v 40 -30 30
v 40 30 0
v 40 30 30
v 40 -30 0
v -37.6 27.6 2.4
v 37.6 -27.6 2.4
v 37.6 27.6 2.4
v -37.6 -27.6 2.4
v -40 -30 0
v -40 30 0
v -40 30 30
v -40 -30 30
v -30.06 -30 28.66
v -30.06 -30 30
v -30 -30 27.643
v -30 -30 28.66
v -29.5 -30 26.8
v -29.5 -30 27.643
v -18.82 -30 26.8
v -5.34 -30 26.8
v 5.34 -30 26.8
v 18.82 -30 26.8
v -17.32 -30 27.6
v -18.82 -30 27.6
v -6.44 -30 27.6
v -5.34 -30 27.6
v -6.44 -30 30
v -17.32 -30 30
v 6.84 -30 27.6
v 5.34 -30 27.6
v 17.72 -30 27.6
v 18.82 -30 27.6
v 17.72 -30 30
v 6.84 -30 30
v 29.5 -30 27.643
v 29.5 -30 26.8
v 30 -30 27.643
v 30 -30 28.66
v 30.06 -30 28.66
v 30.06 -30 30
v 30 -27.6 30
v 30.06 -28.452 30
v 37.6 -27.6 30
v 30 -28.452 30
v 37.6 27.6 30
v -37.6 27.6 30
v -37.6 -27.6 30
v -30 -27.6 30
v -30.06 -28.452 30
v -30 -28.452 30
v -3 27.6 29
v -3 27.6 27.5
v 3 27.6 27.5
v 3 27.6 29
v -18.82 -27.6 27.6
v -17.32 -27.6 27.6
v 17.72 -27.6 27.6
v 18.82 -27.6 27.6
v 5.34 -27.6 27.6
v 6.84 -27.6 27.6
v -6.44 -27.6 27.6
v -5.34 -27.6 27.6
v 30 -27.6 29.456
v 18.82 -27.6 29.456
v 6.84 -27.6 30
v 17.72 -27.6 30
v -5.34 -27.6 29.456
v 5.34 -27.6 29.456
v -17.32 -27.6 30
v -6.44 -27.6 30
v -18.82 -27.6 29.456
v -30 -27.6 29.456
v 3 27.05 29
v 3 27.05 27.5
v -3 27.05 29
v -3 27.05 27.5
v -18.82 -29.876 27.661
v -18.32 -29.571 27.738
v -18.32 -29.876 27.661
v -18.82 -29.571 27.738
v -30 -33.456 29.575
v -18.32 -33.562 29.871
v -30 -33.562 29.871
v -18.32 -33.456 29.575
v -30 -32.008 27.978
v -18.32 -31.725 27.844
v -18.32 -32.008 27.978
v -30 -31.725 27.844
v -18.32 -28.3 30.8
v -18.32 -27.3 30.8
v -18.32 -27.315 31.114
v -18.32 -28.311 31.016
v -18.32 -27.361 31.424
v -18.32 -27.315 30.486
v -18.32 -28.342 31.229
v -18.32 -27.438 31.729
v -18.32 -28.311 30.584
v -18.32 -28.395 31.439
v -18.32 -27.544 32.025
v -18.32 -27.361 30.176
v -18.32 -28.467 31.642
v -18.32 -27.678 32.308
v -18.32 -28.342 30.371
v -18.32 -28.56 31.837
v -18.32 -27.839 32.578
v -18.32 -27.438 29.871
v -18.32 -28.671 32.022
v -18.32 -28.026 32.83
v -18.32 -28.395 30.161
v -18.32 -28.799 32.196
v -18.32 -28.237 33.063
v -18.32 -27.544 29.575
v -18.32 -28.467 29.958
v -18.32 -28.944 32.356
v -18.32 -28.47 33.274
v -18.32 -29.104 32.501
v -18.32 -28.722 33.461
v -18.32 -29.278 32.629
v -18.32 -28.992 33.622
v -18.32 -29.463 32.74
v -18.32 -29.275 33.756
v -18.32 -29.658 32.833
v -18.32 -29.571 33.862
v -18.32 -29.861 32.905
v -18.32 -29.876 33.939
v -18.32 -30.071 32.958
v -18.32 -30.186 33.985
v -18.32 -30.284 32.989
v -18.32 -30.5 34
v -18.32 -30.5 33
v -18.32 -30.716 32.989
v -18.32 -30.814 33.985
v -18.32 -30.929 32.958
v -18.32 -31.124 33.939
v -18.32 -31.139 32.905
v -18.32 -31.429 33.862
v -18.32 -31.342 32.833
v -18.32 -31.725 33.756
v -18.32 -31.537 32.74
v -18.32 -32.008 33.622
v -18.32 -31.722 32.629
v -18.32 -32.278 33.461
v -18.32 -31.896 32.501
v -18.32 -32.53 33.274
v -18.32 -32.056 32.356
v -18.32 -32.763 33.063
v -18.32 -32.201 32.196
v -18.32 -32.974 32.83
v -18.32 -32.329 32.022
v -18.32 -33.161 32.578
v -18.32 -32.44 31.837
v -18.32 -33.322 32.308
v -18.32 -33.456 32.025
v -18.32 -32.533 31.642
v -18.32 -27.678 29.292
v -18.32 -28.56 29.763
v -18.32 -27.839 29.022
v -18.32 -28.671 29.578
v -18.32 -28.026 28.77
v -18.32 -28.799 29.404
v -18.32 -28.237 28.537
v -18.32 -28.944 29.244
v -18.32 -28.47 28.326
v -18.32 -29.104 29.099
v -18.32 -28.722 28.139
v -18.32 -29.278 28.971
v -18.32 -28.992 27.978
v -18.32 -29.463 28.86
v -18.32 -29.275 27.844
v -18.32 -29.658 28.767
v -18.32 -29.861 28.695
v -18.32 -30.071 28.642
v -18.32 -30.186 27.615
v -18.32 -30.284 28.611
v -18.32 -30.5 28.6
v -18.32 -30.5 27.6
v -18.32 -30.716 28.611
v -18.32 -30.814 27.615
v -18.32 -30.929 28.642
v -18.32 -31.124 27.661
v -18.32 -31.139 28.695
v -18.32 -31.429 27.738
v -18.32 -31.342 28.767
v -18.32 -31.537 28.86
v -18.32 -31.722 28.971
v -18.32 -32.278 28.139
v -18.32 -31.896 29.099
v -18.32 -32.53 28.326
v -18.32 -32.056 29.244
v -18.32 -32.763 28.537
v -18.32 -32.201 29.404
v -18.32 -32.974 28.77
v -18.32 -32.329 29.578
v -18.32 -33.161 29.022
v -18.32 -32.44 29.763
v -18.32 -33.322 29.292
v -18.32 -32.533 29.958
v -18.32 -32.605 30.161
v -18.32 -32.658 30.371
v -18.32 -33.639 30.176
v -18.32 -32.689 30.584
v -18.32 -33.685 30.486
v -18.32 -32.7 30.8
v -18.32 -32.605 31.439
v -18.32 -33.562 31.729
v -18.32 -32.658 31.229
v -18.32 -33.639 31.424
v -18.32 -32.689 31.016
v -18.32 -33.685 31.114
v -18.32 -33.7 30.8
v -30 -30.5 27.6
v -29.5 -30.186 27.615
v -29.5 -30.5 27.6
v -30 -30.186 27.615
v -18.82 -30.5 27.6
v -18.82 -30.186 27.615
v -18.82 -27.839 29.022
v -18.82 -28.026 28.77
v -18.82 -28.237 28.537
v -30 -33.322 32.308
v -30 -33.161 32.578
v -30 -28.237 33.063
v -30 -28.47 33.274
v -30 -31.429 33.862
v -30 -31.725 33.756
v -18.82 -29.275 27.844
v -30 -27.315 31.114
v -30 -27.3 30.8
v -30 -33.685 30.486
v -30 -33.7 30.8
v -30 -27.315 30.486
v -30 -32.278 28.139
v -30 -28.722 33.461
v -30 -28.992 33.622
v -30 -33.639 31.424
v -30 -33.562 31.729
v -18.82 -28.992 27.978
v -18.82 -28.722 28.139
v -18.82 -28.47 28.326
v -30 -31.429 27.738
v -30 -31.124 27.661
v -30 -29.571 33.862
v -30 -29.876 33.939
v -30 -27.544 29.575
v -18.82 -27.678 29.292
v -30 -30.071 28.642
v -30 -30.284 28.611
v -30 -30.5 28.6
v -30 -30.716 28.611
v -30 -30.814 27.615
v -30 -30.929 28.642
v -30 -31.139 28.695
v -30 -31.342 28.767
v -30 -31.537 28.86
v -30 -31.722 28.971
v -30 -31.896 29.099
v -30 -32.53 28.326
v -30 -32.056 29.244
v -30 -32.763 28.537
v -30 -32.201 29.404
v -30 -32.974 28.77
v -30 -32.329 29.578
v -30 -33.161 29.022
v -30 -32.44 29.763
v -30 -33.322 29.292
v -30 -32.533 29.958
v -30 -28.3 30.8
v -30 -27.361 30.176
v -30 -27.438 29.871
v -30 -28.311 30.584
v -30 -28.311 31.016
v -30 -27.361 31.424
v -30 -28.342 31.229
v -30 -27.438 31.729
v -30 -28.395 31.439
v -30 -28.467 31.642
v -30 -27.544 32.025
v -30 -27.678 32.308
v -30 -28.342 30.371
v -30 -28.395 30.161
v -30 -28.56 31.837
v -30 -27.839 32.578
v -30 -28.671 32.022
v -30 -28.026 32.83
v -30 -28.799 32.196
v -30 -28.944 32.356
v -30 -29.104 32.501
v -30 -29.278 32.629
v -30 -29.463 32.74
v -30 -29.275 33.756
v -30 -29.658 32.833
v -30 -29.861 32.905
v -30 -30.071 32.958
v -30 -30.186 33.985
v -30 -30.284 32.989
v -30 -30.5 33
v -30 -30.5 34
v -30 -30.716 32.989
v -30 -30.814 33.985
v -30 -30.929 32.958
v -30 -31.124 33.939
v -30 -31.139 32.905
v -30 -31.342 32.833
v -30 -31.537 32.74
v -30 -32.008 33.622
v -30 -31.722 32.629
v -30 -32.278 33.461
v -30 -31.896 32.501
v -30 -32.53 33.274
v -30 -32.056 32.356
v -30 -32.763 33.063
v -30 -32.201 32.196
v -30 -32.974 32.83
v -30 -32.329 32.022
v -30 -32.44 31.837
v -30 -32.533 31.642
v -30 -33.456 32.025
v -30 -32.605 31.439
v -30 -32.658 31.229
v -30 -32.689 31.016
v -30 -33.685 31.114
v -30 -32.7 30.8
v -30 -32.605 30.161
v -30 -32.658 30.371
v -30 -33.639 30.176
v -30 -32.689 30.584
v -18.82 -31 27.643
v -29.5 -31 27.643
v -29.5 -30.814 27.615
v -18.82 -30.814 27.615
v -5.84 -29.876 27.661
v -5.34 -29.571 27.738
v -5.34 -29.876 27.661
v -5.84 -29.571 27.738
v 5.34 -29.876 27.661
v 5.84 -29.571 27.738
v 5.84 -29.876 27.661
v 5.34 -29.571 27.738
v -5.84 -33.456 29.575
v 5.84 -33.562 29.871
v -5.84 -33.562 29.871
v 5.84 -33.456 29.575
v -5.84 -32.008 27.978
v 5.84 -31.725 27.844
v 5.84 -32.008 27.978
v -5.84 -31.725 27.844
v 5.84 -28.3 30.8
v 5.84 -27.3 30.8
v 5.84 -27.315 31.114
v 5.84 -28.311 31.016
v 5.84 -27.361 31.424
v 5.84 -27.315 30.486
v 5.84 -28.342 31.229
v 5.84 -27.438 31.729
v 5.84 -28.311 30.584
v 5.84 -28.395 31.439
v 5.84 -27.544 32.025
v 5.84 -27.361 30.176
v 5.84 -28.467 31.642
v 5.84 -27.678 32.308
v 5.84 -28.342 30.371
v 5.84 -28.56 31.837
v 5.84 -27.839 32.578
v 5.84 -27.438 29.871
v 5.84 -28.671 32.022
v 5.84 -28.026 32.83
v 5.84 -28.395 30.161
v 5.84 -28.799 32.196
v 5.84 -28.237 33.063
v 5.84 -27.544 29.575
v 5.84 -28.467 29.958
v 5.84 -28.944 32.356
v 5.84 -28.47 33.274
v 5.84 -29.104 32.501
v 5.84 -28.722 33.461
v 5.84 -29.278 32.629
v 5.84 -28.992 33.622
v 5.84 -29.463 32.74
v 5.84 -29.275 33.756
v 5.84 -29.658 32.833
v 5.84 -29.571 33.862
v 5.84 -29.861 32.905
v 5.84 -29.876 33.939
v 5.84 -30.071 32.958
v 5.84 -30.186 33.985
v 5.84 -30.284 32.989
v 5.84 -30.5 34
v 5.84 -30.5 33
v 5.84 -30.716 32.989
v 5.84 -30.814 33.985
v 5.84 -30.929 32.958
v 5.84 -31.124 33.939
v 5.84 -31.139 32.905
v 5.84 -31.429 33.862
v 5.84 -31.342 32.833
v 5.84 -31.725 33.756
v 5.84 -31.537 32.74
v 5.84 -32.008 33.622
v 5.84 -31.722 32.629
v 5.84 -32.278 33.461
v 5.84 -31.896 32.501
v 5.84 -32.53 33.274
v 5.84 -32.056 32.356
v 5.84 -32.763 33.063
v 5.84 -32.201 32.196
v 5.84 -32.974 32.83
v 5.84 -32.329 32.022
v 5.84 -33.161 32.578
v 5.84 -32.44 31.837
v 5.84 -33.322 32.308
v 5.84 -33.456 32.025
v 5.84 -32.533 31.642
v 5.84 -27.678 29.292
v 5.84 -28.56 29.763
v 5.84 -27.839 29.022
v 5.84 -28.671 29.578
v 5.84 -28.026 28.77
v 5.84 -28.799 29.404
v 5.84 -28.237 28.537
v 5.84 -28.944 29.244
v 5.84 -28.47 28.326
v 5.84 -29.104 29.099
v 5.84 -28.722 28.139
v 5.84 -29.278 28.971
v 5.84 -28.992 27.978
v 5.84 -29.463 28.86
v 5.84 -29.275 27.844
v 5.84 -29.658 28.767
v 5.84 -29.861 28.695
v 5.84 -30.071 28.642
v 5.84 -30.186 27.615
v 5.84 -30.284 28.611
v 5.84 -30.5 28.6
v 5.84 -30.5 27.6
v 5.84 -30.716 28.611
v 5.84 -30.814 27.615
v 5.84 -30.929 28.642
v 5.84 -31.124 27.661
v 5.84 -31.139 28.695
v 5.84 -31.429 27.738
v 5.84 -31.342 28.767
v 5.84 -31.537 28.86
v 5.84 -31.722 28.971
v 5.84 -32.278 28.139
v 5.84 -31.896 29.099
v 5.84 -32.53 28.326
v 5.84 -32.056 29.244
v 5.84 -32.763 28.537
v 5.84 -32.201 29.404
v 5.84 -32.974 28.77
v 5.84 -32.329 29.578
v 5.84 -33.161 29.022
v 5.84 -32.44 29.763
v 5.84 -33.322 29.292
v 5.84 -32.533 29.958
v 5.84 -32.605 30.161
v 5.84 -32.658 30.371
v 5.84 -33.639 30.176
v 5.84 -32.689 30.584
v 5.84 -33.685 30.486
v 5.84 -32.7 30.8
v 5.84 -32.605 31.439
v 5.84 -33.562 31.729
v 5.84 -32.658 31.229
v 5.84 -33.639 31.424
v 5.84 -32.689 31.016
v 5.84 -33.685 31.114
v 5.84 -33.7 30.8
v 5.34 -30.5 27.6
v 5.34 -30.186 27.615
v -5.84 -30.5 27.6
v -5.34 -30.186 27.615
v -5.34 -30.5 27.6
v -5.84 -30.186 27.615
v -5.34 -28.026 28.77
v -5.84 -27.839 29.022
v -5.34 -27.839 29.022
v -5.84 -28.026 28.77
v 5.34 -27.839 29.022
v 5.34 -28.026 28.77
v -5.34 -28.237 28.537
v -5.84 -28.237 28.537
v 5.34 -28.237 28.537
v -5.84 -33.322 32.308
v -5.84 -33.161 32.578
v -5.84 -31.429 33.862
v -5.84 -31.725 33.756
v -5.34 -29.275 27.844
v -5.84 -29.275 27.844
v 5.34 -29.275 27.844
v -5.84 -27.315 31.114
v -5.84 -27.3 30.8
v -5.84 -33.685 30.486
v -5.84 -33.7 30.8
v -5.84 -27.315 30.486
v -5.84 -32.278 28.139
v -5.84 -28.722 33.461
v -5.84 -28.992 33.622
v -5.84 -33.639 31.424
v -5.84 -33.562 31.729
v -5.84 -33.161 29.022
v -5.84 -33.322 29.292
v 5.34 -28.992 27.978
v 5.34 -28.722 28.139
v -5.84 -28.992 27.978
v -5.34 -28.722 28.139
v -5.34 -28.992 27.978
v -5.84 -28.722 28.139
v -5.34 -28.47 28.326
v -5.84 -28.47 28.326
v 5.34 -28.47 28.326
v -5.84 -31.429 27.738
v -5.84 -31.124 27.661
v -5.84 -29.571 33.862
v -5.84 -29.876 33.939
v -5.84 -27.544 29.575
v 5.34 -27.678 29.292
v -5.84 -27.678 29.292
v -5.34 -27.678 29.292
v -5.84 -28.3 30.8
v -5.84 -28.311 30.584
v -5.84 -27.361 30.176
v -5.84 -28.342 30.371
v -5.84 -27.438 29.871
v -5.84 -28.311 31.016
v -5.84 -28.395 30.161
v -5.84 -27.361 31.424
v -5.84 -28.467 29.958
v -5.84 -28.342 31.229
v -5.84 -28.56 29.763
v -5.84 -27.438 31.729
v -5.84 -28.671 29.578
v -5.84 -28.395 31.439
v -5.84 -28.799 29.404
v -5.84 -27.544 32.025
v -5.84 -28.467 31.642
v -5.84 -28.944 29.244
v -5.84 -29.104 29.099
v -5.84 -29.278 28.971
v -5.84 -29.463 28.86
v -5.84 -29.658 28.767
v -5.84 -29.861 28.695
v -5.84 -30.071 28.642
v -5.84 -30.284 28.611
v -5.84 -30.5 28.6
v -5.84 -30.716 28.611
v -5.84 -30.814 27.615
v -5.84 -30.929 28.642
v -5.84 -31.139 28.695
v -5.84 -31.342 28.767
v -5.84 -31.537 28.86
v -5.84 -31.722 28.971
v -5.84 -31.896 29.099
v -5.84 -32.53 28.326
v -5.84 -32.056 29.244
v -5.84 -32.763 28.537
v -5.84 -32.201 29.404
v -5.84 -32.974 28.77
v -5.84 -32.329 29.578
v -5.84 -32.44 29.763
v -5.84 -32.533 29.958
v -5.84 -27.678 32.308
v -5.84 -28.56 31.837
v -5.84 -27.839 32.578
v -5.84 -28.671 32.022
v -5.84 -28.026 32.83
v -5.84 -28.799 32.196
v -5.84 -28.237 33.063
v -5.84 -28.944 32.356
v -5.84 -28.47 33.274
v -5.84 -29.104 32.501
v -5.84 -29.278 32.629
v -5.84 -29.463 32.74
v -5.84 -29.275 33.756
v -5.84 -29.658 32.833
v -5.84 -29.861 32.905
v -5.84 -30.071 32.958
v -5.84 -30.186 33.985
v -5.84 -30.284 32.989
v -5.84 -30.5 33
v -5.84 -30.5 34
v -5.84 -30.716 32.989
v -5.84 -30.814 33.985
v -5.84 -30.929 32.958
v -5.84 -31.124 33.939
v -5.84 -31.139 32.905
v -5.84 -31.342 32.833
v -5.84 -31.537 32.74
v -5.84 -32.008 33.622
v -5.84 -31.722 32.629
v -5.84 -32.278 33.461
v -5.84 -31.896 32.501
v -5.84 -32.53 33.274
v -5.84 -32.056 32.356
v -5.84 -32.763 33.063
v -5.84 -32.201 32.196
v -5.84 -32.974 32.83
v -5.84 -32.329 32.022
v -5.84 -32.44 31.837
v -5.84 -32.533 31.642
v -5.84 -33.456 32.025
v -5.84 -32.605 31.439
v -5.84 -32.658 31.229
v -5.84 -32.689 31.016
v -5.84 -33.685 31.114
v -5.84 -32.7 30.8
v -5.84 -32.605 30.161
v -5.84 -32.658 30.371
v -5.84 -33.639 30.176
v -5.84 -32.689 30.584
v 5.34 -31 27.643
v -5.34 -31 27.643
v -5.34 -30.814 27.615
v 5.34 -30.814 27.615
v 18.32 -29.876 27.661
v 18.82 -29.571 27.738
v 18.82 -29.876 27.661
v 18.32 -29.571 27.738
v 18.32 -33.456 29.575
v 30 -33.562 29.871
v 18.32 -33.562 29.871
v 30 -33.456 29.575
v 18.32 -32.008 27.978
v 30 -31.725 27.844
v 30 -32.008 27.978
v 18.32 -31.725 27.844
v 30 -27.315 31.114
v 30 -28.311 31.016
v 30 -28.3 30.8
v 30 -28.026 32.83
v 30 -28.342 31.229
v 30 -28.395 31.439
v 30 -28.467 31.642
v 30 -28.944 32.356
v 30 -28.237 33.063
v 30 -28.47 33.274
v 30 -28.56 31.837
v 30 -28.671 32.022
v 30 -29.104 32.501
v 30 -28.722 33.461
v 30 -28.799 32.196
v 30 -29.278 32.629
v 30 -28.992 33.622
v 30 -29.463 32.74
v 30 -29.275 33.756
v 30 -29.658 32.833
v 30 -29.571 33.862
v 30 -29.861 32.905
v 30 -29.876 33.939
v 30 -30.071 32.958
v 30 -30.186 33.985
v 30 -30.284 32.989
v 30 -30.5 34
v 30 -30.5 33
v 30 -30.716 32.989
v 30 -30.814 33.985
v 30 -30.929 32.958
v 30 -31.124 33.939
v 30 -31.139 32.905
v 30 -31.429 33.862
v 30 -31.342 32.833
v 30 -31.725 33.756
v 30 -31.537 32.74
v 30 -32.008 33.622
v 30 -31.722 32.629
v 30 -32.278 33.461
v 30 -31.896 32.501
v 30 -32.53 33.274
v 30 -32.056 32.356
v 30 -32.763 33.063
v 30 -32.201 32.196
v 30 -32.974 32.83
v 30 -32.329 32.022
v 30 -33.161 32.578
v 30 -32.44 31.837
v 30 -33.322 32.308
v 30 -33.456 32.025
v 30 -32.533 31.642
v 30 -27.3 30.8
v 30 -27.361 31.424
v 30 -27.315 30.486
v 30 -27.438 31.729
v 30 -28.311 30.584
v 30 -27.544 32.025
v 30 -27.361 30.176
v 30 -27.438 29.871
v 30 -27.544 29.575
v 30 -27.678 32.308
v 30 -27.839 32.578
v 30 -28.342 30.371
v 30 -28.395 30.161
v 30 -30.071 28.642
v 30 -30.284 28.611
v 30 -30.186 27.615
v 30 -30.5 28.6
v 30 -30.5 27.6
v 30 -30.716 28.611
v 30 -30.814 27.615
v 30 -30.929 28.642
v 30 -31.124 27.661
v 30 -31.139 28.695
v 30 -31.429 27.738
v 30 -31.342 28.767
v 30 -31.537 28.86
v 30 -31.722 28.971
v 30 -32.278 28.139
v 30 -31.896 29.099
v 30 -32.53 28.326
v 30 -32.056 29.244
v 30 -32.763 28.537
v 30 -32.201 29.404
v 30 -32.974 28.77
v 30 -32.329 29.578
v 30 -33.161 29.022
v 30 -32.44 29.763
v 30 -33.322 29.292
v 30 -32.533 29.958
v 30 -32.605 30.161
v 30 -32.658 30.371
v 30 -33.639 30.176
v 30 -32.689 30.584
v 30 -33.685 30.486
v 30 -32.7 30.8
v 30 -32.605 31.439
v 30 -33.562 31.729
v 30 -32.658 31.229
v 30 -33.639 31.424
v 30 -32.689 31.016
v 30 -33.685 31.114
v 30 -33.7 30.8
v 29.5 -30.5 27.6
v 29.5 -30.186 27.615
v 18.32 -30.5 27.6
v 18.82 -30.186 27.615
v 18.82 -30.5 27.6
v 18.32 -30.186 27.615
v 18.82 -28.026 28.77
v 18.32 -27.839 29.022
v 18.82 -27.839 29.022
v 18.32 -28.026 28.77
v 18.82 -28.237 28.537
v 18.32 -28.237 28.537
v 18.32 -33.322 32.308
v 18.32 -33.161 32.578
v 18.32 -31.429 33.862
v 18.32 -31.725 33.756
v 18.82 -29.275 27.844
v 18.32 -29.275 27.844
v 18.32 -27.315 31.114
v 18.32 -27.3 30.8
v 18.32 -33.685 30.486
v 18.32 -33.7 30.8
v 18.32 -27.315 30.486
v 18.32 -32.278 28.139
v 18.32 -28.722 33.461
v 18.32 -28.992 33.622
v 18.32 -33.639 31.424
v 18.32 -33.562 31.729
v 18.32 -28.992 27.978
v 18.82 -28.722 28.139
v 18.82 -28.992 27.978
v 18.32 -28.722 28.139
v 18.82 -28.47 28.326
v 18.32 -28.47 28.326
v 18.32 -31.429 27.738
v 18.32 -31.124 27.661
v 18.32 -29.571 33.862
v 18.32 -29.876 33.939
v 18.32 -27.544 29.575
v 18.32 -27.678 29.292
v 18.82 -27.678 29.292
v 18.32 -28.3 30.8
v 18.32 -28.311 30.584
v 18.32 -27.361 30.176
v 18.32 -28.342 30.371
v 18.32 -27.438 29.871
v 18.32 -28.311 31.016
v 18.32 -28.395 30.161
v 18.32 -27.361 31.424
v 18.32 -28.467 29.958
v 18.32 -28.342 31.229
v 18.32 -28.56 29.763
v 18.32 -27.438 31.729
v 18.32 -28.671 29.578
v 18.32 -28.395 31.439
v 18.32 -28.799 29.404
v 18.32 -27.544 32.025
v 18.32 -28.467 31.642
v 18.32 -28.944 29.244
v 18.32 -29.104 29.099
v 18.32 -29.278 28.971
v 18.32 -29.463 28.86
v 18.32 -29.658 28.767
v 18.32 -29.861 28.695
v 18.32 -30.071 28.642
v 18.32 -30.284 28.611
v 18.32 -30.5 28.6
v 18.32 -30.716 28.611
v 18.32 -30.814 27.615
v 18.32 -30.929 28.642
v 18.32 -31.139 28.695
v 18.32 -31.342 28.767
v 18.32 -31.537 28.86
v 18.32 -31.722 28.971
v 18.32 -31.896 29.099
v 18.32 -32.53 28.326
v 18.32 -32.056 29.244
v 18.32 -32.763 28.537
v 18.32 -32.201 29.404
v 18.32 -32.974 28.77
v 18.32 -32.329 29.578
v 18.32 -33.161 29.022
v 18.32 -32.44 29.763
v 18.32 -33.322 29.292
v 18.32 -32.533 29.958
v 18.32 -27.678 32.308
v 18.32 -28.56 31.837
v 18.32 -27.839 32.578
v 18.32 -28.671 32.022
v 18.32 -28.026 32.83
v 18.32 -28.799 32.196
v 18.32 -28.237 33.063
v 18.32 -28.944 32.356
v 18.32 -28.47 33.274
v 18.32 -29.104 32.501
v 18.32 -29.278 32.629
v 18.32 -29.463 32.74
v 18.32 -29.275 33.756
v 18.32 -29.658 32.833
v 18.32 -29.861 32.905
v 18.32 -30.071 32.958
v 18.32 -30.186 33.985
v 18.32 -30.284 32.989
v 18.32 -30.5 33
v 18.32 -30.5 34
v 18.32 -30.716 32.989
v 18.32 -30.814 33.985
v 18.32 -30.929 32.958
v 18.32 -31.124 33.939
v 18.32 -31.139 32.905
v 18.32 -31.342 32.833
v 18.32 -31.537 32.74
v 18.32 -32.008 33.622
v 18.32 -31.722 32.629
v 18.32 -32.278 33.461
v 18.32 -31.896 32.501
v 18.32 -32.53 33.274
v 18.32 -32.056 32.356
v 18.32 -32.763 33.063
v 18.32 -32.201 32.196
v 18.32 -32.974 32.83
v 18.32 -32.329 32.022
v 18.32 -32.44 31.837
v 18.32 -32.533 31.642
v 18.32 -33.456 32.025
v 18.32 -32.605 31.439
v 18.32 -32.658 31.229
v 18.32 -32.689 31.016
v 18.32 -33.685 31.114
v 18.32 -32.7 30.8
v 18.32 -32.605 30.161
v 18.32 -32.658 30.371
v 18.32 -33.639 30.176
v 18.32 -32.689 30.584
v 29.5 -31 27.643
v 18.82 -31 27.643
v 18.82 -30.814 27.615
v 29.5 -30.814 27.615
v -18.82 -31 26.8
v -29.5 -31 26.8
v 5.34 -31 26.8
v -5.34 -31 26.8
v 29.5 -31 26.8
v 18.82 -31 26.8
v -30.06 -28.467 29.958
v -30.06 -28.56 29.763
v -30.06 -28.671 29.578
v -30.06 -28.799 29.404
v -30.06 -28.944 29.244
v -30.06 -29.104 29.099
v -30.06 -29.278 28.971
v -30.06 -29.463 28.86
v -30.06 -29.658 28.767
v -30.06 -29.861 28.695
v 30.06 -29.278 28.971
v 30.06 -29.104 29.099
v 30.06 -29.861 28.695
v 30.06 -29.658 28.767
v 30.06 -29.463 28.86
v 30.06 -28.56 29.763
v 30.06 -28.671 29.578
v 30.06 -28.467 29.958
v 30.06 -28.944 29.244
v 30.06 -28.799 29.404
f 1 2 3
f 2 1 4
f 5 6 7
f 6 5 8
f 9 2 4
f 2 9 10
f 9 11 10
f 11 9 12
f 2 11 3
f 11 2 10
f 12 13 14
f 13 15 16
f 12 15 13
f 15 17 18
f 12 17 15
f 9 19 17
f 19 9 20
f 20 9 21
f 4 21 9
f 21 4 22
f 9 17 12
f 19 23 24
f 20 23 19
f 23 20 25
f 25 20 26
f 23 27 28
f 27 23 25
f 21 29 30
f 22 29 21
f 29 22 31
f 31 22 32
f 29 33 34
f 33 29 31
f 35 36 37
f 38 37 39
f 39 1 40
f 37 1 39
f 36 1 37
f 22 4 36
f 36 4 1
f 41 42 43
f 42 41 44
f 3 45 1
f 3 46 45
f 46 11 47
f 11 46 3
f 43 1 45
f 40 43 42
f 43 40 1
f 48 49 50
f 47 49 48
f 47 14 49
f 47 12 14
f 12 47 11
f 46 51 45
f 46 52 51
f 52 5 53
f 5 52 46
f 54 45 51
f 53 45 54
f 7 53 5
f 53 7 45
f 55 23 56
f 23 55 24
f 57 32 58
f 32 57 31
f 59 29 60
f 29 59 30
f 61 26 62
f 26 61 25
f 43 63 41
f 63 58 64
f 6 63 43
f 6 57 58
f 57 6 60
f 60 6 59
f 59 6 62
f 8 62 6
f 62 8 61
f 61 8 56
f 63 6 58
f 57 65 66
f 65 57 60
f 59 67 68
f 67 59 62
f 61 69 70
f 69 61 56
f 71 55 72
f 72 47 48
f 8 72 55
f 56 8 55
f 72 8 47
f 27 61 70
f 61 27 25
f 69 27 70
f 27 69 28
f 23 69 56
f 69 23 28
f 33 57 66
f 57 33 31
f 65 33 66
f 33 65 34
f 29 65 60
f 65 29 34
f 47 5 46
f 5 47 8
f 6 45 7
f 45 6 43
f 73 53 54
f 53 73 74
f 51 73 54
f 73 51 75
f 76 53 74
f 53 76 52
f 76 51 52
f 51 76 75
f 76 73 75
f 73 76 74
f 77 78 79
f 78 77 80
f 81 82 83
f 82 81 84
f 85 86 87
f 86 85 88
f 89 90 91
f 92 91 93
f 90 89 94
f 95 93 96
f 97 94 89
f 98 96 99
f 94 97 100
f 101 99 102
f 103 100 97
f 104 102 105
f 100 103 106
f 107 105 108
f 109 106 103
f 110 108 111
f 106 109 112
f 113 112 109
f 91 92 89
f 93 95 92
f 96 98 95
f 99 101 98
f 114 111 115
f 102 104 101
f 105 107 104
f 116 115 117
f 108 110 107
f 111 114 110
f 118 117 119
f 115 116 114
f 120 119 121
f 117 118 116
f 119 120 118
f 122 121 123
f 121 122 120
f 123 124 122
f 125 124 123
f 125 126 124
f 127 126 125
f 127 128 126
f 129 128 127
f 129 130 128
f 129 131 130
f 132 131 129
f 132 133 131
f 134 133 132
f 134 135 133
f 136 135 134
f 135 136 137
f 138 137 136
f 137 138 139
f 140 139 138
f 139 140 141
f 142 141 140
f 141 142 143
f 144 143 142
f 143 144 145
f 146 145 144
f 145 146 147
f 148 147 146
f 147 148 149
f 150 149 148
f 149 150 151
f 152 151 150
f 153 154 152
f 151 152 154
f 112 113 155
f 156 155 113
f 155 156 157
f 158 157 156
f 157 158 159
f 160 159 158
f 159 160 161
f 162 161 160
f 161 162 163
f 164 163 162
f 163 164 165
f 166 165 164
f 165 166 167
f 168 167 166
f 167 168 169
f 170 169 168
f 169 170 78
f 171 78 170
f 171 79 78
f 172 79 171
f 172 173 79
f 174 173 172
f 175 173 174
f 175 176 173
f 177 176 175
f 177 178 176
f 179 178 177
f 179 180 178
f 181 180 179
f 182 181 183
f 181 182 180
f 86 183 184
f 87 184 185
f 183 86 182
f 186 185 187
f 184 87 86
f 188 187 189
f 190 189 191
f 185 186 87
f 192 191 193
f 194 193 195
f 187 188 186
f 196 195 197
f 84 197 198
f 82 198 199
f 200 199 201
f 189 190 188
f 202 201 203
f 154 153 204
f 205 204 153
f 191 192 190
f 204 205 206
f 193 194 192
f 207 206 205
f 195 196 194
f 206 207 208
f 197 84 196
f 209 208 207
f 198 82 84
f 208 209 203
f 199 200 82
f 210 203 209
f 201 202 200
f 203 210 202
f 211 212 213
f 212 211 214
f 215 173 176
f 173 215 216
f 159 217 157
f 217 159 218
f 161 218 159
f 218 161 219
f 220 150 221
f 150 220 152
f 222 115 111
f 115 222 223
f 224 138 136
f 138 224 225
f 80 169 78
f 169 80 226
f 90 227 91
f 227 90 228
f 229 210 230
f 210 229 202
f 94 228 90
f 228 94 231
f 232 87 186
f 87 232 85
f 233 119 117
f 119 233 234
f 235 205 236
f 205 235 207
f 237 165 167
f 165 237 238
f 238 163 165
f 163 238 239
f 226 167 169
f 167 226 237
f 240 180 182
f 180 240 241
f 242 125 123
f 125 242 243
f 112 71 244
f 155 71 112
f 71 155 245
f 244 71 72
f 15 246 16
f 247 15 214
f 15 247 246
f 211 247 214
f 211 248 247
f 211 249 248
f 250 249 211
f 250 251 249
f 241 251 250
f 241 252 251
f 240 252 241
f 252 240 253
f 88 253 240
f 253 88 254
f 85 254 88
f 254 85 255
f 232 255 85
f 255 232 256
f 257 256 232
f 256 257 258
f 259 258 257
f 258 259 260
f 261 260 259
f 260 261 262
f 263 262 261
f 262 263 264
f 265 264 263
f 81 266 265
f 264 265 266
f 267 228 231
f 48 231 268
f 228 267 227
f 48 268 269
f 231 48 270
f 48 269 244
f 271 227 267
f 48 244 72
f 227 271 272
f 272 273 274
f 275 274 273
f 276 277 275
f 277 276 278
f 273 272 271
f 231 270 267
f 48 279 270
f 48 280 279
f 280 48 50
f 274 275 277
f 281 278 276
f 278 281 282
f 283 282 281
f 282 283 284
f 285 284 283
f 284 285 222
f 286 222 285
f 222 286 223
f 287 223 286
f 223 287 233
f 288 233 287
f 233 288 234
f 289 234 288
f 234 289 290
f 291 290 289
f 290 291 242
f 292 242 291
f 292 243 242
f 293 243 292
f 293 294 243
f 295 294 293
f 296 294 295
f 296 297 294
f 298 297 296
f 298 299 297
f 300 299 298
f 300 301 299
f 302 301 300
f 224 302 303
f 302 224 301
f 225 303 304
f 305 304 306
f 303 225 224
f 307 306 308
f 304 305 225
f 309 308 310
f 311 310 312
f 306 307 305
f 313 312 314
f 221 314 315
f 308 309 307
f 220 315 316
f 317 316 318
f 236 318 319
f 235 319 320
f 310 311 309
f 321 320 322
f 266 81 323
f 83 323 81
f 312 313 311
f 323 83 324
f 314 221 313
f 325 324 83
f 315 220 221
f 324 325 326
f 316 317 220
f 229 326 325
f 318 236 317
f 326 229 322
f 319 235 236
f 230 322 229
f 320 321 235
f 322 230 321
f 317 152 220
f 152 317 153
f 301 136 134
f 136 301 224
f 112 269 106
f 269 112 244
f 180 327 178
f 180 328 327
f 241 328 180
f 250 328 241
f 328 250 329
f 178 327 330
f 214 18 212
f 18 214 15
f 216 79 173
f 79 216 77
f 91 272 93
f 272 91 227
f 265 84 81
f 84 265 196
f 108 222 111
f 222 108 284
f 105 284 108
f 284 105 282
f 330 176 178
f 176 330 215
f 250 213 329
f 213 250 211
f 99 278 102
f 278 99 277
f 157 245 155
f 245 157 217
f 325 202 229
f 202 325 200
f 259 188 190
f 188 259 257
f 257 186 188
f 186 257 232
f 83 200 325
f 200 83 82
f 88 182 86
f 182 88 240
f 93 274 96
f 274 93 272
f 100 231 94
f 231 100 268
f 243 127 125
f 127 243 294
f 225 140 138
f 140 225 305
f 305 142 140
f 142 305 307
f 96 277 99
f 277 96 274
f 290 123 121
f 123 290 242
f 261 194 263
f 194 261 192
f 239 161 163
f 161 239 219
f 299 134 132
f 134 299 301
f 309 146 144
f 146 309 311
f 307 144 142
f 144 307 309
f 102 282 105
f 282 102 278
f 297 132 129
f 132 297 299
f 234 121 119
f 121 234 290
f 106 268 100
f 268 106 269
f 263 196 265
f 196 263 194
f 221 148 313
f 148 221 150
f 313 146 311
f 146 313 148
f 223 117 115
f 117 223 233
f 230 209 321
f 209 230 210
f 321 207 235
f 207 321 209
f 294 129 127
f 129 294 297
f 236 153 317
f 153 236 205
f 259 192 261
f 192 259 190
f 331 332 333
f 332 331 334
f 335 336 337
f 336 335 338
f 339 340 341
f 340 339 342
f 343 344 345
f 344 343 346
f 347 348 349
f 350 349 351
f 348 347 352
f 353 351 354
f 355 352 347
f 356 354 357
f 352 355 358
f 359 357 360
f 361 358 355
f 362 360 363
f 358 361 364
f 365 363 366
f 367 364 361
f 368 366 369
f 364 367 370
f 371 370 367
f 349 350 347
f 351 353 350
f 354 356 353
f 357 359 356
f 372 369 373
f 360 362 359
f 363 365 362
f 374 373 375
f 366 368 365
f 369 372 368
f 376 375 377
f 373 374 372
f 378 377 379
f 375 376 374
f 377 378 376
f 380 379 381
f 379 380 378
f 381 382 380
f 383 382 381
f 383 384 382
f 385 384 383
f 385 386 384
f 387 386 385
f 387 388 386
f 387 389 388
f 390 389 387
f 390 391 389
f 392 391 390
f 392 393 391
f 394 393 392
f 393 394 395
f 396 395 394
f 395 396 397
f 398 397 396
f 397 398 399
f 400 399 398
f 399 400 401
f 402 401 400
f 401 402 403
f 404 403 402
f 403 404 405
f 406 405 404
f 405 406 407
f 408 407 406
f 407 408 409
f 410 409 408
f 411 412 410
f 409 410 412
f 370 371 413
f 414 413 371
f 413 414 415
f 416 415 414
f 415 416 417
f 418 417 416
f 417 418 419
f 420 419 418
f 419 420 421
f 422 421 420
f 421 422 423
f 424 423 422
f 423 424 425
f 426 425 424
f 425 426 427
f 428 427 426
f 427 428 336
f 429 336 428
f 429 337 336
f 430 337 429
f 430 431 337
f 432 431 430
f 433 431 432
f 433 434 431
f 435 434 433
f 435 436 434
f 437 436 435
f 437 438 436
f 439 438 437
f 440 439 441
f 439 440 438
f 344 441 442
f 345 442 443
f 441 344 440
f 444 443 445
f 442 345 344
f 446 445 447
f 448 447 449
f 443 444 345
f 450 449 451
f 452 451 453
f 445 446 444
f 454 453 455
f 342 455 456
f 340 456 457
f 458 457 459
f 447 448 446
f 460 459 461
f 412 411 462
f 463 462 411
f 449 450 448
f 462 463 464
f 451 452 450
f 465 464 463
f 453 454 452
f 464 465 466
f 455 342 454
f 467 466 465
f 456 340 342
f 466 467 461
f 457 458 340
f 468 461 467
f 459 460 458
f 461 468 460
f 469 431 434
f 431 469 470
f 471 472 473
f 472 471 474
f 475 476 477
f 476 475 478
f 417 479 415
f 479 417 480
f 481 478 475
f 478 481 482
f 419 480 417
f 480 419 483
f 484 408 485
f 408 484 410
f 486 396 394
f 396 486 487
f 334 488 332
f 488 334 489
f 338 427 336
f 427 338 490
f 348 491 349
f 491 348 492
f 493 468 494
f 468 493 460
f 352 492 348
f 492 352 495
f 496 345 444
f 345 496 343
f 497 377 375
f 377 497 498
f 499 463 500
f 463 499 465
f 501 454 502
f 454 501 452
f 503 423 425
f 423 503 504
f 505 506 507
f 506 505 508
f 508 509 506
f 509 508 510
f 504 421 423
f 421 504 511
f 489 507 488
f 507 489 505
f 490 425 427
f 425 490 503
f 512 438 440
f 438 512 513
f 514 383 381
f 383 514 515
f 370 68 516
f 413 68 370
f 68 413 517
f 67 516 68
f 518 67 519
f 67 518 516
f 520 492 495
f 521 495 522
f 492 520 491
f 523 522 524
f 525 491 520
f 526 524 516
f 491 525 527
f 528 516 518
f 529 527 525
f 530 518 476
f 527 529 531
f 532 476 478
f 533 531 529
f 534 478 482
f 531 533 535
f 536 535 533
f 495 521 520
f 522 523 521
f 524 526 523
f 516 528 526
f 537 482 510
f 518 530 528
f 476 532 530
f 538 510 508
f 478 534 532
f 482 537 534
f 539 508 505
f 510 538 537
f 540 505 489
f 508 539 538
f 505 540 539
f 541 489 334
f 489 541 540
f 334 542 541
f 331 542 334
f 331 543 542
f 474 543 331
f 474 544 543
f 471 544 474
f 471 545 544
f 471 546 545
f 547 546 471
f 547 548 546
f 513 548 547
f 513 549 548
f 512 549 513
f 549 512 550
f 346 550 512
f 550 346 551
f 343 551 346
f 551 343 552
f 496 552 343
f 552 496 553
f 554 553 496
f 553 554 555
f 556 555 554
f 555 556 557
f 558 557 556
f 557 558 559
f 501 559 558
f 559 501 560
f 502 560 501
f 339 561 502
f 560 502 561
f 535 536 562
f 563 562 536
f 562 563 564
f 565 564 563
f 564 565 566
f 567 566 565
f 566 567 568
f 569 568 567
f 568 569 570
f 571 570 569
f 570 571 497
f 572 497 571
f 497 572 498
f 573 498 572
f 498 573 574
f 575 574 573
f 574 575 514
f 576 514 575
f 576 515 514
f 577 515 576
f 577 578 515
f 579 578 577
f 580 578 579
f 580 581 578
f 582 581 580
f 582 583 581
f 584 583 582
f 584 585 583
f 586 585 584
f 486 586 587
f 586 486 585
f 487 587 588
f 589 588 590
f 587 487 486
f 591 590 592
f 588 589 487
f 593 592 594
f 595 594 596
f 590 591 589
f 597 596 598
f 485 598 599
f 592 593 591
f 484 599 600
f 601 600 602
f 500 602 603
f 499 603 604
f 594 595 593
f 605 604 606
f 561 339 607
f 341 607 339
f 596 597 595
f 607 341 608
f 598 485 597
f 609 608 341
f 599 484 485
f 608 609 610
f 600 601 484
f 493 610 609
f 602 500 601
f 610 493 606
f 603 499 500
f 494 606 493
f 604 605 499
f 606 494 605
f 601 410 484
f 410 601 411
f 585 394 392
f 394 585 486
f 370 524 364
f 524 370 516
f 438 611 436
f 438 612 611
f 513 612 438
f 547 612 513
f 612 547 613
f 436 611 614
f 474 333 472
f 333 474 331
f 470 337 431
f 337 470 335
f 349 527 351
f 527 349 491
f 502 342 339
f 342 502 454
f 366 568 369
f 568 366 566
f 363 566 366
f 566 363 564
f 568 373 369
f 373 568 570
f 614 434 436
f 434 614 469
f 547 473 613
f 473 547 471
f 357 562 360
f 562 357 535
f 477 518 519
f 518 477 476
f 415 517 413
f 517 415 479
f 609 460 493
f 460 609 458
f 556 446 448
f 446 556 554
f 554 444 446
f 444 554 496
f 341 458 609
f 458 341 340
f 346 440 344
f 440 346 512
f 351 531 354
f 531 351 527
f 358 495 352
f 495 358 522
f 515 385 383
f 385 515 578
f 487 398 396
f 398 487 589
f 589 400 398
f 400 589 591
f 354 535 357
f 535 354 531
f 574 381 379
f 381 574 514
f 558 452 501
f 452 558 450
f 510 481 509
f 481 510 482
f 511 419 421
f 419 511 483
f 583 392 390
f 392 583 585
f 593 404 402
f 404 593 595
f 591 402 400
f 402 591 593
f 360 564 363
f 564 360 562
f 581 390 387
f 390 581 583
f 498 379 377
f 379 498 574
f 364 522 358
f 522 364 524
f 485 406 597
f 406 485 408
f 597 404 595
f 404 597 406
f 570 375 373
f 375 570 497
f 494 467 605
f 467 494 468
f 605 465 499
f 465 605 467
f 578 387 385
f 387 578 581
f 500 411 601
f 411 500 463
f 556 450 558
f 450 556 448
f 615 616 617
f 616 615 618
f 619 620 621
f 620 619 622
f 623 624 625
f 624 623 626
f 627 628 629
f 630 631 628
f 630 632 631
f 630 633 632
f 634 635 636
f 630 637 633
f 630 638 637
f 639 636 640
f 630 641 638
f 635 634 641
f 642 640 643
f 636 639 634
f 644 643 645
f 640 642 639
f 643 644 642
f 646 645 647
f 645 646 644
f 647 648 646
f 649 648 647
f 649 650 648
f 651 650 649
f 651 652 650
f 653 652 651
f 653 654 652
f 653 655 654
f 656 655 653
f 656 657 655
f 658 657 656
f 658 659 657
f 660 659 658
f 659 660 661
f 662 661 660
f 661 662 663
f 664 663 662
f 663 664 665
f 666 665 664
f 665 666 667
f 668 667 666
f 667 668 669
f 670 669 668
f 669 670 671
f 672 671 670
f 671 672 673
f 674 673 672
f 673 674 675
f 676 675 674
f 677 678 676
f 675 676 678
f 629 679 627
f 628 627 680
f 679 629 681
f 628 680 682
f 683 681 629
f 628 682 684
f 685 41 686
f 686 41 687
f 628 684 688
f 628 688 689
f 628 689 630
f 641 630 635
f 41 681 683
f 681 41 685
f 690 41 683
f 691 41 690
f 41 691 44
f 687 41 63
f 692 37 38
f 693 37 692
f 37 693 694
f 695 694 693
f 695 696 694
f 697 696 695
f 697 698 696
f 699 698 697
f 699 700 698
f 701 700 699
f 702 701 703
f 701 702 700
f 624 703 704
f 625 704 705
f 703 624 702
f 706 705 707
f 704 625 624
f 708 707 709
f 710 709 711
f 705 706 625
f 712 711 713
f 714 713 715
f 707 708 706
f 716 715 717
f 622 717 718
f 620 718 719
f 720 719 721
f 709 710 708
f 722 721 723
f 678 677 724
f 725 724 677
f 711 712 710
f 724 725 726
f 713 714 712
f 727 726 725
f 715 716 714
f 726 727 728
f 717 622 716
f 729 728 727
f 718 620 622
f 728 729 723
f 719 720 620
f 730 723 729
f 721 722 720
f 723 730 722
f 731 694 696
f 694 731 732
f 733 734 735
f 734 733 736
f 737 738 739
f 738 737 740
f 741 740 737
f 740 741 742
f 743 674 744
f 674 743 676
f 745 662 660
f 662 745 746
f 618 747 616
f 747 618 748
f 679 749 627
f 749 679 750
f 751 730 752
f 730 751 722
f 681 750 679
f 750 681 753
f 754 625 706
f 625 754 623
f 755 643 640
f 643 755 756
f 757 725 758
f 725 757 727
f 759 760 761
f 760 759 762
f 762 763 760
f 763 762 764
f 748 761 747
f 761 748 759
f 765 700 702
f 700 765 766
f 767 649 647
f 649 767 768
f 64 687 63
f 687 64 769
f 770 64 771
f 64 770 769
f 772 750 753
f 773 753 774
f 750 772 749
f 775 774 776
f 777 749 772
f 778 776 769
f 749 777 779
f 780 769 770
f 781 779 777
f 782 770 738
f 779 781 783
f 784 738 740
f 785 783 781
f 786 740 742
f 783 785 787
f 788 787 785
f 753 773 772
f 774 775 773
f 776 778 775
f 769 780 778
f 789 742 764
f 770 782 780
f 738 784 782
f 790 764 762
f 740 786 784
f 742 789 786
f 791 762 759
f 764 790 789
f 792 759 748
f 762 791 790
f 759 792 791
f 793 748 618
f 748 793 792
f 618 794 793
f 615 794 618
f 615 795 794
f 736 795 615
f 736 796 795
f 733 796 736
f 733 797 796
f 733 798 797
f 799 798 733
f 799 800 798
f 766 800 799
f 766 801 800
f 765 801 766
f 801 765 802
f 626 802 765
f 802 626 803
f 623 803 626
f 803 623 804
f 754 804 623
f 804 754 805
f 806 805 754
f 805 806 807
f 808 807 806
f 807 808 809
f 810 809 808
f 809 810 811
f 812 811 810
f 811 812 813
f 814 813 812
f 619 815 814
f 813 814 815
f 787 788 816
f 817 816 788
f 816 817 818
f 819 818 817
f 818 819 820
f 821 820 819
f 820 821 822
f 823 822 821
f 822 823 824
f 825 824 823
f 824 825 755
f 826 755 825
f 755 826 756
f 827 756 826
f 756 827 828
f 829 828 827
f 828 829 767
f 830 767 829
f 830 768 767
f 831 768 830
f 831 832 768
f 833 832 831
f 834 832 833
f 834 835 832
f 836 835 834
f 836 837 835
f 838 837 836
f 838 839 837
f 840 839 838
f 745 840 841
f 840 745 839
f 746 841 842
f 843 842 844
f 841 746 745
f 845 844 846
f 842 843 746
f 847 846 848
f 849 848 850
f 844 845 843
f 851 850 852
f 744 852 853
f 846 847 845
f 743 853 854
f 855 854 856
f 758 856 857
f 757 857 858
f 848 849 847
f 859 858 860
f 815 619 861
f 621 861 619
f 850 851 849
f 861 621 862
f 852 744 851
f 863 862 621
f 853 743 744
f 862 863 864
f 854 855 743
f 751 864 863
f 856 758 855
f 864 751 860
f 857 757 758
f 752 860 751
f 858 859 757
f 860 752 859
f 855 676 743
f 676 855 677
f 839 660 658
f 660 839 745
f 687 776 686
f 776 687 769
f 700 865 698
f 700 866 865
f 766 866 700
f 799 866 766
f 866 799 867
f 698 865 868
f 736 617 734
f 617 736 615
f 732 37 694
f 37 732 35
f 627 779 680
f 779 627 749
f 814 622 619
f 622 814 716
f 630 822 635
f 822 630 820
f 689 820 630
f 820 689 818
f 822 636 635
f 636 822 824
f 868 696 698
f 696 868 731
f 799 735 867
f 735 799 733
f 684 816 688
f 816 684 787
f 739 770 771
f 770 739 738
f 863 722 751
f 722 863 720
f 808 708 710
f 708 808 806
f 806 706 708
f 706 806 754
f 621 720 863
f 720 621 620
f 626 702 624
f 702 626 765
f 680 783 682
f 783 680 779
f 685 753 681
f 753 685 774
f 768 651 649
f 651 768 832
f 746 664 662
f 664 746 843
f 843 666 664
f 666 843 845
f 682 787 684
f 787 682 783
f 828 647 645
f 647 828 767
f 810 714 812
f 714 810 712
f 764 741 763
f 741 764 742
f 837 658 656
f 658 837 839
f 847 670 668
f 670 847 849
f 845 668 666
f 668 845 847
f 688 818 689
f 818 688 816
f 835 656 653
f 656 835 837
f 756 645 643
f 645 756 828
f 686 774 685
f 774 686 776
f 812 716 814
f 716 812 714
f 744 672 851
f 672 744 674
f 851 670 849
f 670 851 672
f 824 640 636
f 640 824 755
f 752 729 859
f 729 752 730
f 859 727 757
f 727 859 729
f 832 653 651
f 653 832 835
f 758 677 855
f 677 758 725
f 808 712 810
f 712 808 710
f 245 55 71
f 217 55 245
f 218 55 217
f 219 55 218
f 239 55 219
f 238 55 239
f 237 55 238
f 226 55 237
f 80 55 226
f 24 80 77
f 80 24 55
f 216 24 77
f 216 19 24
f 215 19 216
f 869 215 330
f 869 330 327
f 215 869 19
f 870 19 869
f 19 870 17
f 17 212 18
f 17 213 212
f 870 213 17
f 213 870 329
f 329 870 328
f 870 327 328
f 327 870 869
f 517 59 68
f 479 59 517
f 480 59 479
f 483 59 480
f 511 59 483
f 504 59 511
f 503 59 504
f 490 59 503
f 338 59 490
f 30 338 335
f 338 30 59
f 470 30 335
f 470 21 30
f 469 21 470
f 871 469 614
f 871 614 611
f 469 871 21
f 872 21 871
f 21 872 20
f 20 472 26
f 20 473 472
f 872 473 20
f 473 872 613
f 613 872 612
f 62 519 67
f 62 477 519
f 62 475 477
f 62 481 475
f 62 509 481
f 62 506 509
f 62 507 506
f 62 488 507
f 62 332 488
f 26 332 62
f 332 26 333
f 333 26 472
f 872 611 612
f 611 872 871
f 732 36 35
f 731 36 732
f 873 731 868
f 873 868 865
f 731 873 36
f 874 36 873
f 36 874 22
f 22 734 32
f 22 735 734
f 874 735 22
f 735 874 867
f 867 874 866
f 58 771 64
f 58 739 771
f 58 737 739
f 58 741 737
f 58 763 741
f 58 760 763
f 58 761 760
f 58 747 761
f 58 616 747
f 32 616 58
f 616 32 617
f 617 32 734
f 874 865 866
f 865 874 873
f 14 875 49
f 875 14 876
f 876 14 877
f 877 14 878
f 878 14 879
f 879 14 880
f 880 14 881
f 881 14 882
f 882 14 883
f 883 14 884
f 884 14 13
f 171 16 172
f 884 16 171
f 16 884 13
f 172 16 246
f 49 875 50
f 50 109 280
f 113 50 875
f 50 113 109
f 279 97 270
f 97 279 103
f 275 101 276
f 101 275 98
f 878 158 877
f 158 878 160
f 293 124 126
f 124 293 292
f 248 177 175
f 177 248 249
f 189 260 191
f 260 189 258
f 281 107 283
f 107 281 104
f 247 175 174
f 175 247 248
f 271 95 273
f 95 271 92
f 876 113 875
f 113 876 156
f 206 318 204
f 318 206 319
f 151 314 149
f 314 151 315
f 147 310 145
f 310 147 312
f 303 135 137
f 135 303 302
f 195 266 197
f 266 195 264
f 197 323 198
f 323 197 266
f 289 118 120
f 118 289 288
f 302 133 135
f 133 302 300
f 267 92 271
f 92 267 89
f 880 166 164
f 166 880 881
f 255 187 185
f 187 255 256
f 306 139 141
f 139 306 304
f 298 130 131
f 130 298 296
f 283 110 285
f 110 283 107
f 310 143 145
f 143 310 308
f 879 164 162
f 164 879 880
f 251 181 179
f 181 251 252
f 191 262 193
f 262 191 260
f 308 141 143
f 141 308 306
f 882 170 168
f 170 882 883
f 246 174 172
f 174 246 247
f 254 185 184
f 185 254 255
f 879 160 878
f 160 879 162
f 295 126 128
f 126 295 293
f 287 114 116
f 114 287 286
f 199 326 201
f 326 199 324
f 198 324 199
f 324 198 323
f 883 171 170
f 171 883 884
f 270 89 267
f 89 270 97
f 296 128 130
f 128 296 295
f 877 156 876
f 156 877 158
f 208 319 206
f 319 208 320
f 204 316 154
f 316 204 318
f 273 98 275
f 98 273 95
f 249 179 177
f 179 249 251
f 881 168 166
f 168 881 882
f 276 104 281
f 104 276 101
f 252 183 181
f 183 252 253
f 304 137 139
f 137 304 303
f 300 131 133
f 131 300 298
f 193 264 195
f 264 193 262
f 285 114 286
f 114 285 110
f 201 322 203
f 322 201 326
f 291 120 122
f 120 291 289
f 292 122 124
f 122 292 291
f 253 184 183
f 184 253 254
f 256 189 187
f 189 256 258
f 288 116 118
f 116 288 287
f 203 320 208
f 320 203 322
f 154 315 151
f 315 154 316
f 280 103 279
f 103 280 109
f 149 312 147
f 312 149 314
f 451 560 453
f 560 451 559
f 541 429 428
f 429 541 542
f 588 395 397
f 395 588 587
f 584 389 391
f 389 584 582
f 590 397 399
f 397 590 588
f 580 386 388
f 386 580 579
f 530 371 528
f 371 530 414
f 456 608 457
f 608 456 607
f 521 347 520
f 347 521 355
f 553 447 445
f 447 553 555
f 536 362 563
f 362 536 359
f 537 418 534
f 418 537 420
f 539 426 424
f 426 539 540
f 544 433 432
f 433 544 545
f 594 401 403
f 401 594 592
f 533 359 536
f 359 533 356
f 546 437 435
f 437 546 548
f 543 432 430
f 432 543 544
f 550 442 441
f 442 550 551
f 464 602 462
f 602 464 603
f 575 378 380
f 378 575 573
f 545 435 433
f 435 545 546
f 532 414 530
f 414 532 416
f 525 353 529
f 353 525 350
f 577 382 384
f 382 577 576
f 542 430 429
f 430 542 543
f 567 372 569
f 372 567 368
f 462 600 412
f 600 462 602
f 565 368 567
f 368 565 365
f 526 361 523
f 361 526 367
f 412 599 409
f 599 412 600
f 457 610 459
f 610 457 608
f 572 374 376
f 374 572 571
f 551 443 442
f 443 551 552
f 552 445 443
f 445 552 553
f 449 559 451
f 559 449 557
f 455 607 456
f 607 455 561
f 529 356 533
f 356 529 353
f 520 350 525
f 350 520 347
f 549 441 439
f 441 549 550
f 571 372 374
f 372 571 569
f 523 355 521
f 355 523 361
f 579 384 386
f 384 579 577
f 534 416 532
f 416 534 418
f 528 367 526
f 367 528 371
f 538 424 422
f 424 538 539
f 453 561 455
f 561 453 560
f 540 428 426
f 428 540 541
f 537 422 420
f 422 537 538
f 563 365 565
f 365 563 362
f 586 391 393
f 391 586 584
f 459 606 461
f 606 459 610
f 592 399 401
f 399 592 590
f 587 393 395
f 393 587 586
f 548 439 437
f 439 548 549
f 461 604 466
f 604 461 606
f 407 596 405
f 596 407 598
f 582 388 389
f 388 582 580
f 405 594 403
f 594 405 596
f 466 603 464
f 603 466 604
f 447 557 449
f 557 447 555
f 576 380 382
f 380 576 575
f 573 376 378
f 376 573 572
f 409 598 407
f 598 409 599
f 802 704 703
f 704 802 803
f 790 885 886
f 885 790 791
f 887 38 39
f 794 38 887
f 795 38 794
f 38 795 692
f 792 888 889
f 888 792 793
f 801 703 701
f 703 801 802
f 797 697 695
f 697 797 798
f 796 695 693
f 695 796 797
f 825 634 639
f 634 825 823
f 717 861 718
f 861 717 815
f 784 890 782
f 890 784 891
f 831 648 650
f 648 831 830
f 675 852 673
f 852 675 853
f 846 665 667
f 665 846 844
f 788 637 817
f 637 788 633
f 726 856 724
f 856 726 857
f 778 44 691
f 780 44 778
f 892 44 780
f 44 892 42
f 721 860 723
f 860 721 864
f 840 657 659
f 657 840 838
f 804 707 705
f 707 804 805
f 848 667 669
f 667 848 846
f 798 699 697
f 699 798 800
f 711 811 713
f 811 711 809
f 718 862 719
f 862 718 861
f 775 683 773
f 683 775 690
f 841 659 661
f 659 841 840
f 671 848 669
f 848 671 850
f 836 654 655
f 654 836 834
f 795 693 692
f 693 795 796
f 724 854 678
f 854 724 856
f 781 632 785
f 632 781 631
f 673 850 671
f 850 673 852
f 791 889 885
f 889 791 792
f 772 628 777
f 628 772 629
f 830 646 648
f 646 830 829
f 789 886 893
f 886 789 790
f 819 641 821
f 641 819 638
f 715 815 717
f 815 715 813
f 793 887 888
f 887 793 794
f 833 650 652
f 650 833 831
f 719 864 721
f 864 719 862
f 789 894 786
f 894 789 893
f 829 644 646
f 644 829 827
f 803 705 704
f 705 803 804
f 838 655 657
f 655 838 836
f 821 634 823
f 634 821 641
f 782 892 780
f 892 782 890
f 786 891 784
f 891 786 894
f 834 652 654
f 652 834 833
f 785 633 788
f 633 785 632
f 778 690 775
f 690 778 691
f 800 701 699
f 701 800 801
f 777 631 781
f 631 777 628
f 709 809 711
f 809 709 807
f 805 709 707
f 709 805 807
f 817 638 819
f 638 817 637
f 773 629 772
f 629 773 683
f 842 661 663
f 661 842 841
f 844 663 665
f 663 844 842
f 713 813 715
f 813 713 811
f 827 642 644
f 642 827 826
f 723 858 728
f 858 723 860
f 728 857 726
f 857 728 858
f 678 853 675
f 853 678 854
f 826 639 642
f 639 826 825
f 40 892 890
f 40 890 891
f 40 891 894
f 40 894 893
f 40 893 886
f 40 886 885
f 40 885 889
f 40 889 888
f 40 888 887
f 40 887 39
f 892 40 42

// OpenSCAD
// Box with print-in-place hinge (v4: bridge webs to kill band overhangs)
part = "box"; // [box, lid, pin, assembly]
cadverify_only = "";
module instance(name, part, unit = 1) {
    echo(cadverify_instance = [name, part, unit]);
    if (cadverify_only == "" || cadverify_only == name) children();
}

Rkn = 3.2; rbore = 2.2; rpin = 1.9;
yh = -30.5; zh = 30.8;
lid_zh = 3.4;
lid_lift = 27.4;
pin_lift_z = 27.8; pin_shift_y = -30.5;
k0x0=-30; k0x1=-18.32;
k1x0=-17.92; k1x1=-6.24;
k2x0=-5.84; k2x1=5.84;
k3x0=6.24; k3x1=17.92;
k4x0=18.32; k4x1=30;

$fn = 64;

module xcyl(x0, x1, r, y, z) {
    translate([x0, y, z]) rotate([0, 90, 0]) cylinder(r = r, h = x1 - x0);
}

module box_part() {
    difference() {
        union() {
            translate([-40, -30, 0]) cube([80, 60, 2.4]);
            translate([-40, 27.6, 2.4]) cube([80, 2.4, 27.6]);
            translate([-40, -30, 2.4]) cube([80, 2.4, 27.6 - 2.4]);
            // top band of back wall split into segs clearing lid knuckles axially (0.6 gap each side)
            translate([-40, -30, 27.0]) cube([11.48, 2.4, 3.0]);
            translate([-17.32, -30, 27.0]) cube([10.88, 2.4, 3.0]);
            translate([6.84, -30, 27.0]) cube([10.88, 2.4, 3.0]);
            translate([28.52, -30, 27.0]) cube([11.48, 2.4, 3.0]);
            translate([-40, -27.6, 2.4]) cube([2.4, 55.2, 27.6]);
            translate([37.6, -27.6, 2.4]) cube([2.4, 55.2, 27.6]);
            translate([-3, 27.05, 27.5]) cube([6, 0.6, 1.5]);
            // hinge knuckles + support webs tying them to the back wall
            xcyl(k0x0, k0x1, Rkn, yh, zh);
            xcyl(k2x0, k2x1, Rkn, yh, zh);
            xcyl(k4x0, k4x1, Rkn, yh, zh);
            translate([k0x0 + 0.5, -31, 26.8]) cube([k0x1-k0x0 - 1.0, 3.4, 4.0]);
            translate([k2x0 + 0.5, -31, 26.8]) cube([k2x1-k2x0 - 1.0, 3.4, 4.0]);
            translate([k4x0 + 0.5, -31, 26.8]) cube([k4x1-k4x0 - 1.0, 3.4, 4.0]);
        }
        xcyl(k0x0-0.06, k0x1+0.06, rbore, yh, zh);
        xcyl(k2x0-0.06, k2x1+0.06, rbore, yh, zh);
        xcyl(k4x0-0.06, k4x1+0.06, rbore, yh, zh);
    }
}

module lid_part() {
    difference() {
        union() {
            translate([-40, -30, 10.6]) cube([80, 60, 2.4]);
            translate([-40, 27.6, 3]) cube([80, 2.4, 7.6]);
            translate([-17.92, -30, 3]) cube([11.68, 2.4, 7.6]);
            translate([6.24, -30, 3]) cube([11.68, 2.4, 7.6]);
            translate([-40, -30, 3]) cube([9.2, 2.4, 7.6]);
            translate([-5.24, -30, 3]) cube([10.48, 2.4, 7.6]);
            translate([18.92, -30, 3]) cube([10.48, 2.4, 7.6]);
            translate([30.8, -30, 3]) cube([9.2, 2.4, 7.6]);
            translate([-40, -27.6, 3]) cube([2.4, 55.2, 7.6]);
            translate([37.6, -27.6, 3]) cube([2.4, 55.2, 7.6]);
            translate([-37.2, 25.2, 0]) cube([74.4, 2.0, 10.6]);
            translate([-37.2, -27.2, 0]) cube([74.4, 2.0, 10.6]);
            translate([-37.2, -25.2, 0]) cube([2.0, 50.4, 10.6]);
            translate([35.2, -25.2, 0]) cube([2.0, 50.4, 10.6]);
            xcyl(k1x0, k1x1, Rkn, yh, lid_zh);
            xcyl(k3x0, k3x1, Rkn, yh, lid_zh);
            translate([k1x0 + 0.5, -31, 0]) cube([k1x1-k1x0 - 1.0, 3.4, 5]);
            translate([k3x0 + 0.5, -31, 0]) cube([k3x1-k3x0 - 1.0, 3.4, 5]);
        }
        xcyl(k1x0-0.06, k1x1+0.06, rbore, yh, lid_zh);
        xcyl(k3x0-0.06, k3x1+0.06, rbore, yh, lid_zh);
        translate([-3.35, 26.4, -0.05]) cube([6.7, 1.55, 2.05]);
    }
}

module pin_part() {
    union() {
        xcyl(-32.4, 32.4, 1.8, 0, 3);
        xcyl(31.4, 32.4, 2.8, 0, 3);
        xcyl(-32.4, -31.4, 2.8, 0, 3);
    }
}

if (part == "box") {
    echo(cadverify_spec = [
        ["bounds", [[-40, -33.7, 0], [40, 30, 34.0]]],
        ["bodies", 1],
        ["through_holes", 3],
        ["support_faces", [["bed", "-z", 4000]]],
        ["overhangs_allowed", [["hinge knuckles, bores and wall cutouts print in place", [[-30.2, -33.9, 26.5], [30.2, -27.1, 33.5]]], ["catch bump underside, tiny 3.6 mm2 ledge", [[-3.2, 26.8, 27.3], [3.2, 27.8, 27.7]]]]],
        ["copies", 1],
        ["details", [
            ["floor", "thickness", [0, 0, -1], [0, 0, 1], 2.4],
            ["front_wall", "thickness", [0, 31, 15], [0, -1, 0], 2.4],
            ["cavity", "void", [[-37.6, -27.6, 2.4], [37.6, 27.6, 29.9]], 0.9],
            ["hinge_bore", "hole", [-31, -30.5, 30.8], [1, 0, 0], [[0, 4.4], [11.6, 4.4]]],
            ["catch_bump", "material", [[-3, 27.05, 27.5], [3, 27.6, 29.0]], 0.9],
            ["hinge_view", "view", [[-30, -34, 26.5], [30, -27, 34.5]]]
        ]]
    ]);
    box_part();
} else if (part == "lid") {
    echo(cadverify_spec = [
        ["bounds", [[-40, -33.7, 0], [40, 30, 13]]],
        ["bodies", 1],
        ["through_holes", 2],
        ["support_faces", [["bed", "-z", 300]]],
        ["overhangs_allowed", [
            ["hinge knuckles and bores print in place", [[-18.2, -33.9, 0], [18.2, -27.1, 4.2]]],
            ["lid top bridging over plug cavity", [[-37.2, -24.9, 10.1], [37.2, 25.2, 11.1]]],
            ["lid skirt bottom band, flat 0.4-gap bridge when assembled", [[-40.2, -30.2, 2.8], [40.2, 30.2, 3.2]]],
            ["lid skirt inner ledge over box rim, flat bridge", [[-37.8, -30.2, 10.4], [37.8, 27.8, 10.8]]],
            ["hinge knuckle underside rounds, 0.4-gap print bridge", [[-18.2, -33.9, 3.0], [18.2, -27.1, 6.6]]],
            ["lid back skirt gaps between knuckles, flat bridge", [[-30.6, -30.2, 2.8], [30.6, -27.4, 3.4]]],
            ["notch top face over notch void, tiny bridge", [[-3.5, 26.3, 1.8], [3.5, 28.0, 2.2]]]
        ]],
        ["copies", 1],
        ["details", [
            ["top", "thickness", [0, 0, 14], [0, 0, -1], 2.4],
            ["skirt", "thickness", [0, 31, 6], [0, -1, 0], 2.4],
            ["plug_cavity", "void", [[-35.2, -24.9, 0], [35.2, 25.2, 10.5]], 0.9],
            ["hinge_bore", "hole", [-18.6, -30.5, 3.4], [1, 0, 0], [[0, 4.4], [11.6, 4.4]]],
            ["catch_notch", "void", [[-3.35, 26.4, 0], [3.35, 27.95, 2.0]], 0.9],
            ["catch_view", "view", [[-5, 26.3, 0], [5, 28.5, 3]]]
        ]]
    ]);
    lid_part();
} else if (part == "pin") {
    echo(cadverify_spec = [
        ["bounds", [[-32.4, -2.8, 0.2], [32.4, 2.8, 5.8]]],
        ["bodies", 1],
        ["support_faces", []],
        ["overhangs_allowed", [["pin shaft underside bridges with 0.3 gap", [[-32.4, -1.9, 0], [32.4, 1.9, 1.6]]]]],
        ["copies", 1],
        ["details", [
            ["shaft", "thickness", [0, 3, 3], [0, -1, 0], 3.6],
            ["head", "material", [[31.4, -2.8, 0], [32.4, 2.8, 6]], 0.7],
            ["pin_view", "view", [[-32.4, -3, 0], [32.4, 3, 6]]]
        ]]
    ]);
    pin_part();
} else if (part == "assembly") {
    echo(cadverify_spec = [
        ["bounds", [[-40, -33.7, 0], [40, 30, 40.4]]],
        ["support_faces", [["bed", "-z", 4000]]],
        ["allowed_interferences", []],
        ["motions", [
            ["lid_open", ["lid"], "rotate", [0, -30.5, 30.8], [1, 0, 0], [0, 110], ["flex", [["lid", "box", 0.5, "catch bump clearance pass"]]]]
        ]],
        ["assembly_order", [
            [["box"], [0, 0, 0]],
            [["lid"], [0, 0, -1]],
            [["pin"], [1, 0, 0]]
        ]],
        ["print_in_place", 0.3],
        ["overhangs_allowed", [
            ["hinge undersides, pin bridge and cutouts in place", [[-33, -34, 26.5], [33, -27, 34.8]]],
            ["lid top bridging over box cavity", [[-37.2, -24.9, 37.5], [37.2, 25.2, 38.5]]],
            ["front lid skirt band over box rim, 0.4 gap flat bridge", [[-40.2, -30.2, 30.2], [40.2, 30.2, 30.6]]],
            ["lid plug bottom face over print gap, flat bridge", [[-37.4, -27.4, 27.2], [37.4, 27.4, 27.6]]],
            ["lid skirt inner ledge over box rim, flat bridge", [[-37.8, -30.2, 37.8], [37.8, 27.8, 38.2]]],
            ["notch top face over notch void, tiny bridge", [[-3.5, 26.3, 29.2], [3.5, 28.0, 29.6]]],
            ["catch bump underside, tiny 3.6 mm2 ledge", [[-3.2, 26.9, 27.3], [3.2, 27.8, 27.7]]]
        ]]
    ]);
    instance("box", "box") box_part();
    instance("lid", "lid") translate([0, 0, lid_lift]) lid_part();
    instance("pin", "pin") translate([0, pin_shift_y, pin_lift_z]) pin_part();
}
